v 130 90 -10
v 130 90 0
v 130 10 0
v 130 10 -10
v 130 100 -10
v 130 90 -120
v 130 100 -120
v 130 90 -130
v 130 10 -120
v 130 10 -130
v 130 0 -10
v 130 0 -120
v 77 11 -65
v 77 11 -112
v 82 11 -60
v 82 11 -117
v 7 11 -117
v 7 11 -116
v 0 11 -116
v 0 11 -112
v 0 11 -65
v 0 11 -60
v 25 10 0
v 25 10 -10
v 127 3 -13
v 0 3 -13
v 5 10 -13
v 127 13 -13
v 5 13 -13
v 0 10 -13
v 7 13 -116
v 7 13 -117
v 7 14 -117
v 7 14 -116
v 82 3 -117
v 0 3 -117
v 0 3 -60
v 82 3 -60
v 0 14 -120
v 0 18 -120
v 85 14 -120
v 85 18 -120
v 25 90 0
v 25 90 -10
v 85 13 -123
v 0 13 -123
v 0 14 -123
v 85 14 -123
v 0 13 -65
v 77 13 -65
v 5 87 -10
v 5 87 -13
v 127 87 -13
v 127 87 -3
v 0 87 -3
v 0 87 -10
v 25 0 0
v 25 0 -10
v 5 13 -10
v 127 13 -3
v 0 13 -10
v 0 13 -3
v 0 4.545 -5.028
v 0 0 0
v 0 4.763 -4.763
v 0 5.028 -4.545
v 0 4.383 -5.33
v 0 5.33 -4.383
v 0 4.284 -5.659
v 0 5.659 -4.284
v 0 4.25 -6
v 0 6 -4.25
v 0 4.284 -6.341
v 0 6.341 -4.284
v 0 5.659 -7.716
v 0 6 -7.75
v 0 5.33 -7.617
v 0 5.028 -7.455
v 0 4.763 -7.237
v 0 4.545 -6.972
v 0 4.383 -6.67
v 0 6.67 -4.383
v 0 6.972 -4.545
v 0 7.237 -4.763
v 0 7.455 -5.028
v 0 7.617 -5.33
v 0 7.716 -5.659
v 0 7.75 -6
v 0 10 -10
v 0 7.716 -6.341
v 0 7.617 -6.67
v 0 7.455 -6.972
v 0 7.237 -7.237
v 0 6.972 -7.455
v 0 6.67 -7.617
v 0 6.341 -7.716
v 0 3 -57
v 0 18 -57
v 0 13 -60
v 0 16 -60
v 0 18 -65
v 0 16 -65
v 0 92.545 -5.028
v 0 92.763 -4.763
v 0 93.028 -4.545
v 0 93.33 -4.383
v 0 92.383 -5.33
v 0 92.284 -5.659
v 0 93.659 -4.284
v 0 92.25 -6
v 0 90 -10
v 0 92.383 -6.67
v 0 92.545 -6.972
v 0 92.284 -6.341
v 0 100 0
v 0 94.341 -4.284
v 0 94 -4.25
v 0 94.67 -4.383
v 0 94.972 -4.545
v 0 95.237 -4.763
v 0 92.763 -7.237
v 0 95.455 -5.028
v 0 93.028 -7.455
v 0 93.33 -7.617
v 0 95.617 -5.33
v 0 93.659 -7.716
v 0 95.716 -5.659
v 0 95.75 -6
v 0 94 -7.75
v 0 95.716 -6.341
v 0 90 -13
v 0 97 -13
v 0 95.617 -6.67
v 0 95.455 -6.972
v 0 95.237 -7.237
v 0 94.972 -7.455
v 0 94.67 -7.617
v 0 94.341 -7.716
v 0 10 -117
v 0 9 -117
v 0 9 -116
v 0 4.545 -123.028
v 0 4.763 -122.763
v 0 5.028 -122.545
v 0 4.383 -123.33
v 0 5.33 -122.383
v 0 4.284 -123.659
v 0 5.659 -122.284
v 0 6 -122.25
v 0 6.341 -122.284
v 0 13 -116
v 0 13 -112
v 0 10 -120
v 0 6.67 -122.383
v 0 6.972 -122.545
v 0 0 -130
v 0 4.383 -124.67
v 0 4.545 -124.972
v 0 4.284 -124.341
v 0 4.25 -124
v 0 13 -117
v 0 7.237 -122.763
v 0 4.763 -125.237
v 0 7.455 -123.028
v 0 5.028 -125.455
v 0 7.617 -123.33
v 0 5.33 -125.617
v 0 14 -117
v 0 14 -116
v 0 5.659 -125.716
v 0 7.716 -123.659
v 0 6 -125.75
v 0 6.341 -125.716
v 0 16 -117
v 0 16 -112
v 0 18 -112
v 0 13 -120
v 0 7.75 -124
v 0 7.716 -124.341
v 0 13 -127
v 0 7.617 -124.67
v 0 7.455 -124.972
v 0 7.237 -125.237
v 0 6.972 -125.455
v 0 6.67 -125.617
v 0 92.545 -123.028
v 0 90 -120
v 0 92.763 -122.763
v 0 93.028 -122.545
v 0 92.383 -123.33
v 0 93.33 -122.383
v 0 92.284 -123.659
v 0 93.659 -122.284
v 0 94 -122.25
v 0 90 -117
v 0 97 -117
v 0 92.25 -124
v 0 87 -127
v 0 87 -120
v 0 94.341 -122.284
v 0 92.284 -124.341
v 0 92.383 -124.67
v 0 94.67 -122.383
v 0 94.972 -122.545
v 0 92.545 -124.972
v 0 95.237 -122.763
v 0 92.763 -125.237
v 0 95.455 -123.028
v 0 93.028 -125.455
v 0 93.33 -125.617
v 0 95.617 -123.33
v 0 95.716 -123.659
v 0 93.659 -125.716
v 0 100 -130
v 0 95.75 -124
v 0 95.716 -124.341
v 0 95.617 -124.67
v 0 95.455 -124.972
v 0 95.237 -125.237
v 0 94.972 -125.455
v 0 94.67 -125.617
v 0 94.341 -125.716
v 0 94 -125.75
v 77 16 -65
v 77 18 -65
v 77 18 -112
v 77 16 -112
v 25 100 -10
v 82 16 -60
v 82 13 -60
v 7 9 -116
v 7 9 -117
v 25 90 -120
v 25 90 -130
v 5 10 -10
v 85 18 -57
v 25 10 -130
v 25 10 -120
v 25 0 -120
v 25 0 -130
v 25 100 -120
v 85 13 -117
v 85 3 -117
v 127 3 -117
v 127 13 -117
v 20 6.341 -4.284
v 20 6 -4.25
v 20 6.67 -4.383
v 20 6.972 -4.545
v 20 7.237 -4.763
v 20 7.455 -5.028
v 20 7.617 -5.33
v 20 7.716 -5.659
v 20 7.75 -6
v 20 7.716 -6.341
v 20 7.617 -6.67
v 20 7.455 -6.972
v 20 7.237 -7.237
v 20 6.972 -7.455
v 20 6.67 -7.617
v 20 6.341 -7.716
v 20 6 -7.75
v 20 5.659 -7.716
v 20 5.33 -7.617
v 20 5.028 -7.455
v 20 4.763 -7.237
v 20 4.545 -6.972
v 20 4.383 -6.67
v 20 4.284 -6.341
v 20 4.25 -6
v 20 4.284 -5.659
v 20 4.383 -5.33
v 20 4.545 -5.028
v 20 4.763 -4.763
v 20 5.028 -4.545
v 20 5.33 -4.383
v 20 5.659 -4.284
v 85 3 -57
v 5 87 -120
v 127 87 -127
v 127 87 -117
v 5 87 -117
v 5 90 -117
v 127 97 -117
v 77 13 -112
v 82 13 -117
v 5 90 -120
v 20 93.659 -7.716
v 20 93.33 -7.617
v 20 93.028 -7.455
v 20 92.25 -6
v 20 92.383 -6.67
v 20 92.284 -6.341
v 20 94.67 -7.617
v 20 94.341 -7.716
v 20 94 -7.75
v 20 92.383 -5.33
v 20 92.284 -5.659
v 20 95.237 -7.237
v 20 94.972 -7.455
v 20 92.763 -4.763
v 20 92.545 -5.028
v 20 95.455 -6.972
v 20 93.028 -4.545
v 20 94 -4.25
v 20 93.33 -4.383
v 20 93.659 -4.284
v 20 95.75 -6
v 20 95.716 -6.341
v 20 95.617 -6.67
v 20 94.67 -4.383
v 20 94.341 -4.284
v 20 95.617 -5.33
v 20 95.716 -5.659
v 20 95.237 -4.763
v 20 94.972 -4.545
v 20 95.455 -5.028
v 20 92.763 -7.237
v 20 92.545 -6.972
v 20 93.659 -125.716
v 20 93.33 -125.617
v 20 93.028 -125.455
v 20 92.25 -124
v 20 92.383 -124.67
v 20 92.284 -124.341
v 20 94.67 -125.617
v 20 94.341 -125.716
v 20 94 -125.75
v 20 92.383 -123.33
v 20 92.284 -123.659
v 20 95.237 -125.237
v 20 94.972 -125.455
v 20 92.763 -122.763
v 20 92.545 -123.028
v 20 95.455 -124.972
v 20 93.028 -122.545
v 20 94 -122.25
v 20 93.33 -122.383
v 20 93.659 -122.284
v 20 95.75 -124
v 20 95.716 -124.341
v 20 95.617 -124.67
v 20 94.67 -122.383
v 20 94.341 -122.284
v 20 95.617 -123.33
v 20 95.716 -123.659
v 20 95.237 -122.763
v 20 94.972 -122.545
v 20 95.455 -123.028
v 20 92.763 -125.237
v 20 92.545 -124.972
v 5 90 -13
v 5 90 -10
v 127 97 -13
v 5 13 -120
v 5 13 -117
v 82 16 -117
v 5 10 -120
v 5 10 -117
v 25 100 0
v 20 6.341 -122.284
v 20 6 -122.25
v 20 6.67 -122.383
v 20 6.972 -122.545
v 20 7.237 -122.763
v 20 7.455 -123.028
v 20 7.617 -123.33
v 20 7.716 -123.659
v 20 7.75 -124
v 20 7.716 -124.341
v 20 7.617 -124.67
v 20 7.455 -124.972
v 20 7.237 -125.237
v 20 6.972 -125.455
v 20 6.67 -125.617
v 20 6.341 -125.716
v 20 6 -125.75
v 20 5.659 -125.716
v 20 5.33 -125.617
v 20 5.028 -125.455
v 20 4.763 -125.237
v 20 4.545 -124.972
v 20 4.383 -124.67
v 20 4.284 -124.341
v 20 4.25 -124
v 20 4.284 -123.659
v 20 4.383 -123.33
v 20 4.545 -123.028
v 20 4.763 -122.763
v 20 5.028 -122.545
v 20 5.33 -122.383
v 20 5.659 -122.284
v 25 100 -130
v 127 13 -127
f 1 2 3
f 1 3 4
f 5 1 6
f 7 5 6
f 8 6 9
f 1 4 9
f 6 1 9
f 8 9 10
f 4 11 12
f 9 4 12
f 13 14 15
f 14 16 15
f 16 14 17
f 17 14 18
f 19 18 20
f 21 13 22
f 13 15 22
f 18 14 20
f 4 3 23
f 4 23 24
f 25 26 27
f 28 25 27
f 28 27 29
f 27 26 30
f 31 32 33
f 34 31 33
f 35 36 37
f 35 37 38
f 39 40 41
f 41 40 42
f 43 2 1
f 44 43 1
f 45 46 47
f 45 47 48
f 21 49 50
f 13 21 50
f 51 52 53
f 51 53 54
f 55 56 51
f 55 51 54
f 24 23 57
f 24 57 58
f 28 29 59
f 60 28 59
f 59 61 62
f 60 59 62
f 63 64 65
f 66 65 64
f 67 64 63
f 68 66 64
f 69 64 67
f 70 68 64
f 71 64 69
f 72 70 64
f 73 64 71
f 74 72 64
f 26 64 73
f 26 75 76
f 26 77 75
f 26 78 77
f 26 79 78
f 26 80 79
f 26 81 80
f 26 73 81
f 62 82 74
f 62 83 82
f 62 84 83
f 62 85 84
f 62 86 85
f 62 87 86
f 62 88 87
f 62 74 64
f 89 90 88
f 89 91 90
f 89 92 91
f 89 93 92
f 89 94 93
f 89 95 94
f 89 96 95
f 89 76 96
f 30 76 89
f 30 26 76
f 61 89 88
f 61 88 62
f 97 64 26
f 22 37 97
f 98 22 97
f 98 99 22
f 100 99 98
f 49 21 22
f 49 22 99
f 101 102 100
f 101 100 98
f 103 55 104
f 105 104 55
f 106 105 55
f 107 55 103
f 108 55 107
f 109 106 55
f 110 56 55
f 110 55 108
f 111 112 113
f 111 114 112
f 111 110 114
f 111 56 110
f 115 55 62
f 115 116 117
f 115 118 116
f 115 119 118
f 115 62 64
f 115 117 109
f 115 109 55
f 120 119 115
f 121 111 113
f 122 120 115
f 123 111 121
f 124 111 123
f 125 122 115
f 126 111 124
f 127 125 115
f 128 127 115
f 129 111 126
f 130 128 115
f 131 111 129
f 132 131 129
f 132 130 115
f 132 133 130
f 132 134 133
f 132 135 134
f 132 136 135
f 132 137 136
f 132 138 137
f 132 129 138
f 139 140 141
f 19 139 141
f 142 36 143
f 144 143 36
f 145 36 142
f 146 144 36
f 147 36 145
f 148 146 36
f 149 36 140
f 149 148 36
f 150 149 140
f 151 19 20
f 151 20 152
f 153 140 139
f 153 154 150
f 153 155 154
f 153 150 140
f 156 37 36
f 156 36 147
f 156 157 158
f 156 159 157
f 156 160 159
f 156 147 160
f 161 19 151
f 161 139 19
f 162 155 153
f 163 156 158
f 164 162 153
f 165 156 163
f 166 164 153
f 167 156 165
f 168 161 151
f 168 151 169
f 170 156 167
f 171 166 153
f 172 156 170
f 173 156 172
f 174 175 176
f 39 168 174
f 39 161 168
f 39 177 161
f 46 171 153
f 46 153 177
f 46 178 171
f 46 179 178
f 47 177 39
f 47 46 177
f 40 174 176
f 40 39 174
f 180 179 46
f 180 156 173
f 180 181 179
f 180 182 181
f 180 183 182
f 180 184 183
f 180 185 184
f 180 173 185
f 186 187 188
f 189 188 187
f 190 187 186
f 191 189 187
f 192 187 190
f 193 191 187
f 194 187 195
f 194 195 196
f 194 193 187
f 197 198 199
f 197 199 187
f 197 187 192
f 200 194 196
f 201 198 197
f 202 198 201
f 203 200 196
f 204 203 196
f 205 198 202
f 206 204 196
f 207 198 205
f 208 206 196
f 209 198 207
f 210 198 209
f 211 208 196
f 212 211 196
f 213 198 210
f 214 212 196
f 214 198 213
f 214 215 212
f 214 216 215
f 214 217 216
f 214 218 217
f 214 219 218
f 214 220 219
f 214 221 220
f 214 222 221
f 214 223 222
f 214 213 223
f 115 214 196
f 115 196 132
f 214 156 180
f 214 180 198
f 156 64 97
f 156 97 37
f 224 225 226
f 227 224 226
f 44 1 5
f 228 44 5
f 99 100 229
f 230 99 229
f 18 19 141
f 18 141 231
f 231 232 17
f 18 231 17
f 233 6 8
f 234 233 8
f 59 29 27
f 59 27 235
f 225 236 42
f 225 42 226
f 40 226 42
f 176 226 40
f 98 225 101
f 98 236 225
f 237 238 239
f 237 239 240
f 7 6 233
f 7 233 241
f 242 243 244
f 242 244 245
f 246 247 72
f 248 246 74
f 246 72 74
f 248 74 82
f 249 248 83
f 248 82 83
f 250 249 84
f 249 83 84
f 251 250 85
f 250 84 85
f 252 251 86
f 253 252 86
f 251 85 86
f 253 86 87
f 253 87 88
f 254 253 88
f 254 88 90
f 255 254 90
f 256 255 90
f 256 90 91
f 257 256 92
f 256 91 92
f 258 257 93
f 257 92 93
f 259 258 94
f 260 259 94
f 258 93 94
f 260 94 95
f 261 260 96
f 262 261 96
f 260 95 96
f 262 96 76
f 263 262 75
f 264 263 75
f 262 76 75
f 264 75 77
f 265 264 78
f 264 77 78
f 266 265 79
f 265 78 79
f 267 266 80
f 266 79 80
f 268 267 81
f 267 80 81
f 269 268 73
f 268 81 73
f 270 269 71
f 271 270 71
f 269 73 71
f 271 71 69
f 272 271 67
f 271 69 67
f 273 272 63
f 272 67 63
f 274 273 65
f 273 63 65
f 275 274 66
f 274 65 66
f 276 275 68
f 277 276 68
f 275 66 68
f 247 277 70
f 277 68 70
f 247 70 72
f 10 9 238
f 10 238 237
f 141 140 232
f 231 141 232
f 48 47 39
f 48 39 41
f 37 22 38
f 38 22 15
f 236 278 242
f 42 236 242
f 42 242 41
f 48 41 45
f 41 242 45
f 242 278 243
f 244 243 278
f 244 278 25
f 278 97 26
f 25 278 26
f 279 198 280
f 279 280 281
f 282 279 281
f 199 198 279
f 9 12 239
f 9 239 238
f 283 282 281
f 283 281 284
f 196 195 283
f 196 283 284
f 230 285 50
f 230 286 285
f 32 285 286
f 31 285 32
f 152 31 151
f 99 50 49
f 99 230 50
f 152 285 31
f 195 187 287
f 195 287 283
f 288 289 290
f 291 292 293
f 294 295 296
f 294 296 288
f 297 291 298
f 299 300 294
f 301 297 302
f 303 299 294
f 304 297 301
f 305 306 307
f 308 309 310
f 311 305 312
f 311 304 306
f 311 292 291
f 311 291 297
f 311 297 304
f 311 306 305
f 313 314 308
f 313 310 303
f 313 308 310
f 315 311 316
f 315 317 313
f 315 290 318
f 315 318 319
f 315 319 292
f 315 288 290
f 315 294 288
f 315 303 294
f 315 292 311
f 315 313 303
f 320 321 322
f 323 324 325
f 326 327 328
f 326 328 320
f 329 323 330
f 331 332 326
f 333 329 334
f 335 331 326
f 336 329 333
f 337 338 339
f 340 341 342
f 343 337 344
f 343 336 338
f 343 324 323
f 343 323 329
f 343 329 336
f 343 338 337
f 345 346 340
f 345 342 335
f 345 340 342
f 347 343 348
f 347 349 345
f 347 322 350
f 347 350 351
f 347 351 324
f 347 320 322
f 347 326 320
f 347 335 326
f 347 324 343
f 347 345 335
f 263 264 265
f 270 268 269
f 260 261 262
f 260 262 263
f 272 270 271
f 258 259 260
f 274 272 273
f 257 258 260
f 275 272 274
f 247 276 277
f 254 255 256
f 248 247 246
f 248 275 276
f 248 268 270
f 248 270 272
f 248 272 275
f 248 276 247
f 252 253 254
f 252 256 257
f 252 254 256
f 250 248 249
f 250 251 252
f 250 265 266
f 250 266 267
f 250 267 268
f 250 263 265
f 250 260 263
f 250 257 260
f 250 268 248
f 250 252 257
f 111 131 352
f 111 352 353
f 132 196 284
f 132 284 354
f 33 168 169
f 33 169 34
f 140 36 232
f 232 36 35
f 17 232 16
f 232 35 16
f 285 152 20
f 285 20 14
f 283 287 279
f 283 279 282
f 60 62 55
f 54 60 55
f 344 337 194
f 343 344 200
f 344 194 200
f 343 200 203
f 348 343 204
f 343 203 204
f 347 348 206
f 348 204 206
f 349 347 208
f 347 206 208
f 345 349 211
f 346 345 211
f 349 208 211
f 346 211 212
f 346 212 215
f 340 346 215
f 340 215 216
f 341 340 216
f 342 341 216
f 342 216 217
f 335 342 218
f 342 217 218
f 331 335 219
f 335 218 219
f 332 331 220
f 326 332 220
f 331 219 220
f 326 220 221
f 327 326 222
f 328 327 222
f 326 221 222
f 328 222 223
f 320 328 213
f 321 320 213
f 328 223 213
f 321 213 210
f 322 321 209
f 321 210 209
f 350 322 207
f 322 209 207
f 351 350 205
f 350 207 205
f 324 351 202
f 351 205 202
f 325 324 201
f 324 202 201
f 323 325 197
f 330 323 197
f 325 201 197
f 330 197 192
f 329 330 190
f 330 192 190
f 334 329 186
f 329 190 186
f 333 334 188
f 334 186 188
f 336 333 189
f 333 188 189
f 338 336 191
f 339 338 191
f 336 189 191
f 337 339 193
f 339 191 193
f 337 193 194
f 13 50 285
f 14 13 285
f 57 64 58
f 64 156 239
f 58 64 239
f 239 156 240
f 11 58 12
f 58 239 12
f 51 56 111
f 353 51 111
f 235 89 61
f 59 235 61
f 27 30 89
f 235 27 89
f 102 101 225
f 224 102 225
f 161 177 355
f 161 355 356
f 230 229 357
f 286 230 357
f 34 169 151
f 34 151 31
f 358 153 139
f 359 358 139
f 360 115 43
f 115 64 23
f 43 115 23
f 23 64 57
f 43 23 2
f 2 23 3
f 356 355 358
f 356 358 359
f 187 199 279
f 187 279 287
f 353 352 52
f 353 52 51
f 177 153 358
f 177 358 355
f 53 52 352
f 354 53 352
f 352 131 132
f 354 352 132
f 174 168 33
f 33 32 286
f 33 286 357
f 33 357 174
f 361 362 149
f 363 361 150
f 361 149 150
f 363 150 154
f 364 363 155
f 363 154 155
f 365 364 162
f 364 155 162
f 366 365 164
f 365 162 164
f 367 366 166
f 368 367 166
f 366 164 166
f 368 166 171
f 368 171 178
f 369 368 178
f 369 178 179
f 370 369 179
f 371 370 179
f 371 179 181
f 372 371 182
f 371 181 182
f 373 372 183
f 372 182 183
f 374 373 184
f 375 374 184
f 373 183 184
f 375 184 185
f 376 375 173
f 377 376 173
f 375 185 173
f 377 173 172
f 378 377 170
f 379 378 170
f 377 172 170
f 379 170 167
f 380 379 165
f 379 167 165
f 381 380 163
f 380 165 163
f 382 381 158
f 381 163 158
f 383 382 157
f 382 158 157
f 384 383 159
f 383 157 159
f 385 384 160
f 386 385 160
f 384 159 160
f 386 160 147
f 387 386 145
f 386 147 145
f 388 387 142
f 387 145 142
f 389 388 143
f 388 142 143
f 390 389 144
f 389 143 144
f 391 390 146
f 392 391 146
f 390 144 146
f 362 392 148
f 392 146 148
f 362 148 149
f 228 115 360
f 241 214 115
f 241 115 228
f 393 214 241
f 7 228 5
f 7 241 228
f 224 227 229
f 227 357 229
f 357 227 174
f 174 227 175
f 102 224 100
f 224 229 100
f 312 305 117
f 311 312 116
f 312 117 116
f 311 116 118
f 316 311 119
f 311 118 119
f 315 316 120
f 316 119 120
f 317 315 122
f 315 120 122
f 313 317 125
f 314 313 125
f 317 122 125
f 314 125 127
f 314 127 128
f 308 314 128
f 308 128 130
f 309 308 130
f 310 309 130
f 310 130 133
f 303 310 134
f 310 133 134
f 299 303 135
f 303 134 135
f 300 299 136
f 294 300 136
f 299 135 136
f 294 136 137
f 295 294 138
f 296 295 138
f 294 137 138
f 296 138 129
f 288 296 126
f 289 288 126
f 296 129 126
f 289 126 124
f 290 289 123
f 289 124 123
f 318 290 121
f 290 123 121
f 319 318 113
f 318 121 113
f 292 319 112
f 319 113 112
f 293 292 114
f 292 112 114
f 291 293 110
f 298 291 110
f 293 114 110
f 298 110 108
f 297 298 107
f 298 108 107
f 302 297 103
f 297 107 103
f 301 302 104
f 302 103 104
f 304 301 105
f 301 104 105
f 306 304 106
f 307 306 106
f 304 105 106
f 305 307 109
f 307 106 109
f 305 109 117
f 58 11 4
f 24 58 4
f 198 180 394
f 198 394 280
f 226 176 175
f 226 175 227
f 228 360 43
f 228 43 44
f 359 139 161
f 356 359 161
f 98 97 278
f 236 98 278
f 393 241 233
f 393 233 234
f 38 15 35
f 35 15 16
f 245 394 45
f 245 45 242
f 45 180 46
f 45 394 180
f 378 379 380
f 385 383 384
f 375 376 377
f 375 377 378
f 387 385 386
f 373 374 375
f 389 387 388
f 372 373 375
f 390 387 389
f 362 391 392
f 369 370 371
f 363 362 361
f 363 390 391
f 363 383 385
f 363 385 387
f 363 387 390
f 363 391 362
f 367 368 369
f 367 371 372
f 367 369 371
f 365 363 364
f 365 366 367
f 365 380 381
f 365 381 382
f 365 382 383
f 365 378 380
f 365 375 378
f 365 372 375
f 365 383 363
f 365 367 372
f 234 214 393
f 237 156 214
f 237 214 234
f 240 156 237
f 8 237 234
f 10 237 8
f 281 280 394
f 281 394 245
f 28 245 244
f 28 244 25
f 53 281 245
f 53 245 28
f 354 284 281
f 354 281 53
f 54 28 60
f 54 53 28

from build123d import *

# Parameters (mm, degrees)
SKETCH2_W           = 130
SKETCH2_H           = 130
BOSS_EXTRUDE1_DEPTH = 100
SKETCH3_W           = 104
SKETCH3_H           = 74
CUT_EXTRUDE1_DEPTH  = 127
SKETCH4_W           = 10
SKETCH4_H           = 10
CUT_EXTRUDE3_DEPTH  = 105
SKETCH5_W           = 104
SKETCH5_H           = 10
CUT_EXTRUDE4_DEPTH  = 127
SKETCH6_W           = 10
SKETCH6_H           = 74
CUT_EXTRUDE5_DEPTH  = 127
SKETCH7_R           = 1.75
CUT_EXTRUDE6_DEPTH  = 20
SKETCH8_W           = 3
SKETCH8_H           = 3
CUT_EXTRUDE7_DEPTH  = 5
SKETCH9_W           = 85
SKETCH9_H           = 60
BOSS_EXTRUDE2_DEPTH = 15
SKETCH11_W          = 85
SKETCH11_H          = 6
BOSS_EXTRUDE5_DEPTH = 5
SKETCH12_W          = 85
SKETCH12_H          = 3
CUT_EXTRUDE9_DEPTH  = 4
SKETCH13_W          = 82
SKETCH13_H          = 57
CUT_EXTRUDE10_DEPTH = 15
SKETCH15_W          = 3
SKETCH15_H          = 3
BOSS_EXTRUDE7_DEPTH = 5
SKETCH16_W          = 82
SKETCH16_H          = 2
BOSS_EXTRUDE8_DEPTH = 57
SKETCH17_W          = 77
SKETCH17_H          = 47
CUT_EXTRUDE11_DEPTH = 10
SKETCH19_W          = 7
SKETCH19_H          = 2
SKETCH19_H_2        = 1
BOSS_EXTRUDE9_DEPTH = 1
SKETCH21_W          = 3
SKETCH21_H          = 3
CUT_EXTRUDE15_DEPTH = 5


with BuildPart() as part:
    # Sketch2 → Boss-Extrude1 (new body)
    with BuildSketch(Plane(origin=(0, 0, 0), x_dir=(1, 0, 0), z_dir=(0, 1, 0))):
        with Locations((65, 65)):
            Rectangle(SKETCH2_W, SKETCH2_H)
    extrude(amount=BOSS_EXTRUDE1_DEPTH)

    # Sketch3 → Cut-Extrude1 (cut)
    with BuildSketch(Plane.ZY):
        with Locations((-65, 50)):
            Rectangle(SKETCH3_W, SKETCH3_H)
    extrude(amount=-CUT_EXTRUDE1_DEPTH, mode=Mode.SUBTRACT)

    # Sketch4 → Cut-Extrude3 (cut)
    with BuildSketch(Plane(origin=(130, 0, 0), x_dir=(0, 0, -1), z_dir=(1, 0, 0))):
        with Locations((5, 95)):
            Rectangle(SKETCH4_W, SKETCH4_H)
        with Locations((125, 95)):
            Rectangle(SKETCH4_W, SKETCH4_H)
        with Locations((5, 5)):
            Rectangle(SKETCH4_W, SKETCH4_H)
        with Locations((125, 5)):
            Rectangle(SKETCH4_W, SKETCH4_H)
    extrude(amount=-CUT_EXTRUDE3_DEPTH, mode=Mode.SUBTRACT)

    # Sketch5 → Cut-Extrude4 (cut)
    with BuildSketch(Plane.ZY):
        with Locations((-65, 92)):
            Rectangle(SKETCH5_W, SKETCH5_H)
        with Locations((-65, 8)):
            Rectangle(SKETCH5_W, SKETCH5_H)
    extrude(amount=-CUT_EXTRUDE4_DEPTH, mode=Mode.SUBTRACT)

    # Sketch6 → Cut-Extrude5 (cut)
    with BuildSketch(Plane.ZY):
        with Locations((-122, 50)):
            Rectangle(SKETCH6_W, SKETCH6_H)
        with Locations((-8, 50)):
            Rectangle(SKETCH6_W, SKETCH6_H)
    extrude(amount=-CUT_EXTRUDE5_DEPTH, mode=Mode.SUBTRACT)

    # Sketch7 → Cut-Extrude6 (cut)
    with BuildSketch(Plane.ZY):
        with Locations((-124, 94)):
            Circle(SKETCH7_R)
        with Locations((-6, 94)):
            Circle(SKETCH7_R)
        with Locations((-124, 6)):
            Circle(SKETCH7_R)
        with Locations((-6, 6)):
            Circle(SKETCH7_R)
    extrude(amount=-CUT_EXTRUDE6_DEPTH, mode=Mode.SUBTRACT)

    # Sketch8 → Cut-Extrude7 (cut)
    with BuildSketch(Plane.ZY):
        with Locations((-118.5, 88.5)):
            Rectangle(SKETCH8_W, SKETCH8_H)
        with Locations((-11.5, 88.5)):
            Rectangle(SKETCH8_W, SKETCH8_H)
        with Locations((-118.5, 11.5)):
            Rectangle(SKETCH8_W, SKETCH8_H)
        with Locations((-11.5, 11.5)):
            Rectangle(SKETCH8_W, SKETCH8_H)
    extrude(amount=-CUT_EXTRUDE7_DEPTH, mode=Mode.SUBTRACT)

    # Sketch9 → Boss-Extrude2 (add)
    with BuildSketch(Plane(origin=(0, 3, 0), x_dir=(1, 0, 0), z_dir=(0, 1, 0))):
        with Locations((42.5, 87)):
            Rectangle(SKETCH9_W, SKETCH9_H)
    extrude(amount=BOSS_EXTRUDE2_DEPTH)

    # Sketch11 → Boss-Extrude5 (add)
    with BuildSketch(Plane(origin=(0, 13, 0), x_dir=(1, 0, 0), z_dir=(0, 1, 0))):
        with Locations((42.5, 120)):
            Rectangle(SKETCH11_W, SKETCH11_H)
    extrude(amount=BOSS_EXTRUDE5_DEPTH)

    # Sketch12 → Cut-Extrude9 (cut)
    with BuildSketch(Plane(origin=(0, 18, 0), x_dir=(1, 0, 0), z_dir=(0, 1, 0))):
        with Locations((42.5, 121.5)):
            Rectangle(SKETCH12_W, SKETCH12_H)
    extrude(amount=-CUT_EXTRUDE9_DEPTH, mode=Mode.SUBTRACT)

    # Sketch13 → Cut-Extrude10 (cut)
    with BuildSketch(Plane(origin=(0, 18, 0), x_dir=(1, 0, 0), z_dir=(0, 1, 0))):
        with Locations((41, 88.5)):
            Rectangle(SKETCH13_W, SKETCH13_H)
    extrude(amount=-CUT_EXTRUDE10_DEPTH, mode=Mode.SUBTRACT)

    # Sketch15 → Boss-Extrude7 (add)
    with BuildSketch(Plane.ZY.offset(-5)):
        with Locations((-118.5, 11.5)):
            Rectangle(SKETCH15_W, SKETCH15_H)
    extrude(amount=BOSS_EXTRUDE7_DEPTH)

    # Sketch16 → Boss-Extrude8 (add)
    with BuildSketch(Plane(origin=(0, 0, -60), x_dir=(-1, 0, 0), z_dir=(0, 0, -1))):
        with Locations((-41, 17)):
            Rectangle(SKETCH16_W, SKETCH16_H)
        with Locations((-41, 12)):
            Rectangle(SKETCH16_W, SKETCH16_H)
    extrude(amount=BOSS_EXTRUDE8_DEPTH)

    # Sketch17 → Cut-Extrude11 (cut)
    with BuildSketch(Plane(origin=(0, 18, 0), x_dir=(1, 0, 0), z_dir=(0, 1, 0))):
        with Locations((38.5, 88.5)):
            Rectangle(SKETCH17_W, SKETCH17_H)
    extrude(amount=-CUT_EXTRUDE11_DEPTH, mode=Mode.SUBTRACT)

    # Sketch19 → Boss-Extrude9 (add)
    with BuildSketch(Plane.XY.offset(-117)):
        with Locations((3.5, 10)):
            Rectangle(SKETCH19_W, SKETCH19_H)
        with Locations((3.5, 13.5)):
            Rectangle(SKETCH19_W, SKETCH19_H_2)
    extrude(amount=BOSS_EXTRUDE9_DEPTH)

    # Sketch21 → Cut-Extrude15 (cut)
    with BuildSketch(Plane.ZY):
        with Locations((-118.5, 11.5)):
            Rectangle(SKETCH21_W, SKETCH21_H)
    extrude(amount=-CUT_EXTRUDE15_DEPTH, mode=Mode.SUBTRACT)


solid = part.part
